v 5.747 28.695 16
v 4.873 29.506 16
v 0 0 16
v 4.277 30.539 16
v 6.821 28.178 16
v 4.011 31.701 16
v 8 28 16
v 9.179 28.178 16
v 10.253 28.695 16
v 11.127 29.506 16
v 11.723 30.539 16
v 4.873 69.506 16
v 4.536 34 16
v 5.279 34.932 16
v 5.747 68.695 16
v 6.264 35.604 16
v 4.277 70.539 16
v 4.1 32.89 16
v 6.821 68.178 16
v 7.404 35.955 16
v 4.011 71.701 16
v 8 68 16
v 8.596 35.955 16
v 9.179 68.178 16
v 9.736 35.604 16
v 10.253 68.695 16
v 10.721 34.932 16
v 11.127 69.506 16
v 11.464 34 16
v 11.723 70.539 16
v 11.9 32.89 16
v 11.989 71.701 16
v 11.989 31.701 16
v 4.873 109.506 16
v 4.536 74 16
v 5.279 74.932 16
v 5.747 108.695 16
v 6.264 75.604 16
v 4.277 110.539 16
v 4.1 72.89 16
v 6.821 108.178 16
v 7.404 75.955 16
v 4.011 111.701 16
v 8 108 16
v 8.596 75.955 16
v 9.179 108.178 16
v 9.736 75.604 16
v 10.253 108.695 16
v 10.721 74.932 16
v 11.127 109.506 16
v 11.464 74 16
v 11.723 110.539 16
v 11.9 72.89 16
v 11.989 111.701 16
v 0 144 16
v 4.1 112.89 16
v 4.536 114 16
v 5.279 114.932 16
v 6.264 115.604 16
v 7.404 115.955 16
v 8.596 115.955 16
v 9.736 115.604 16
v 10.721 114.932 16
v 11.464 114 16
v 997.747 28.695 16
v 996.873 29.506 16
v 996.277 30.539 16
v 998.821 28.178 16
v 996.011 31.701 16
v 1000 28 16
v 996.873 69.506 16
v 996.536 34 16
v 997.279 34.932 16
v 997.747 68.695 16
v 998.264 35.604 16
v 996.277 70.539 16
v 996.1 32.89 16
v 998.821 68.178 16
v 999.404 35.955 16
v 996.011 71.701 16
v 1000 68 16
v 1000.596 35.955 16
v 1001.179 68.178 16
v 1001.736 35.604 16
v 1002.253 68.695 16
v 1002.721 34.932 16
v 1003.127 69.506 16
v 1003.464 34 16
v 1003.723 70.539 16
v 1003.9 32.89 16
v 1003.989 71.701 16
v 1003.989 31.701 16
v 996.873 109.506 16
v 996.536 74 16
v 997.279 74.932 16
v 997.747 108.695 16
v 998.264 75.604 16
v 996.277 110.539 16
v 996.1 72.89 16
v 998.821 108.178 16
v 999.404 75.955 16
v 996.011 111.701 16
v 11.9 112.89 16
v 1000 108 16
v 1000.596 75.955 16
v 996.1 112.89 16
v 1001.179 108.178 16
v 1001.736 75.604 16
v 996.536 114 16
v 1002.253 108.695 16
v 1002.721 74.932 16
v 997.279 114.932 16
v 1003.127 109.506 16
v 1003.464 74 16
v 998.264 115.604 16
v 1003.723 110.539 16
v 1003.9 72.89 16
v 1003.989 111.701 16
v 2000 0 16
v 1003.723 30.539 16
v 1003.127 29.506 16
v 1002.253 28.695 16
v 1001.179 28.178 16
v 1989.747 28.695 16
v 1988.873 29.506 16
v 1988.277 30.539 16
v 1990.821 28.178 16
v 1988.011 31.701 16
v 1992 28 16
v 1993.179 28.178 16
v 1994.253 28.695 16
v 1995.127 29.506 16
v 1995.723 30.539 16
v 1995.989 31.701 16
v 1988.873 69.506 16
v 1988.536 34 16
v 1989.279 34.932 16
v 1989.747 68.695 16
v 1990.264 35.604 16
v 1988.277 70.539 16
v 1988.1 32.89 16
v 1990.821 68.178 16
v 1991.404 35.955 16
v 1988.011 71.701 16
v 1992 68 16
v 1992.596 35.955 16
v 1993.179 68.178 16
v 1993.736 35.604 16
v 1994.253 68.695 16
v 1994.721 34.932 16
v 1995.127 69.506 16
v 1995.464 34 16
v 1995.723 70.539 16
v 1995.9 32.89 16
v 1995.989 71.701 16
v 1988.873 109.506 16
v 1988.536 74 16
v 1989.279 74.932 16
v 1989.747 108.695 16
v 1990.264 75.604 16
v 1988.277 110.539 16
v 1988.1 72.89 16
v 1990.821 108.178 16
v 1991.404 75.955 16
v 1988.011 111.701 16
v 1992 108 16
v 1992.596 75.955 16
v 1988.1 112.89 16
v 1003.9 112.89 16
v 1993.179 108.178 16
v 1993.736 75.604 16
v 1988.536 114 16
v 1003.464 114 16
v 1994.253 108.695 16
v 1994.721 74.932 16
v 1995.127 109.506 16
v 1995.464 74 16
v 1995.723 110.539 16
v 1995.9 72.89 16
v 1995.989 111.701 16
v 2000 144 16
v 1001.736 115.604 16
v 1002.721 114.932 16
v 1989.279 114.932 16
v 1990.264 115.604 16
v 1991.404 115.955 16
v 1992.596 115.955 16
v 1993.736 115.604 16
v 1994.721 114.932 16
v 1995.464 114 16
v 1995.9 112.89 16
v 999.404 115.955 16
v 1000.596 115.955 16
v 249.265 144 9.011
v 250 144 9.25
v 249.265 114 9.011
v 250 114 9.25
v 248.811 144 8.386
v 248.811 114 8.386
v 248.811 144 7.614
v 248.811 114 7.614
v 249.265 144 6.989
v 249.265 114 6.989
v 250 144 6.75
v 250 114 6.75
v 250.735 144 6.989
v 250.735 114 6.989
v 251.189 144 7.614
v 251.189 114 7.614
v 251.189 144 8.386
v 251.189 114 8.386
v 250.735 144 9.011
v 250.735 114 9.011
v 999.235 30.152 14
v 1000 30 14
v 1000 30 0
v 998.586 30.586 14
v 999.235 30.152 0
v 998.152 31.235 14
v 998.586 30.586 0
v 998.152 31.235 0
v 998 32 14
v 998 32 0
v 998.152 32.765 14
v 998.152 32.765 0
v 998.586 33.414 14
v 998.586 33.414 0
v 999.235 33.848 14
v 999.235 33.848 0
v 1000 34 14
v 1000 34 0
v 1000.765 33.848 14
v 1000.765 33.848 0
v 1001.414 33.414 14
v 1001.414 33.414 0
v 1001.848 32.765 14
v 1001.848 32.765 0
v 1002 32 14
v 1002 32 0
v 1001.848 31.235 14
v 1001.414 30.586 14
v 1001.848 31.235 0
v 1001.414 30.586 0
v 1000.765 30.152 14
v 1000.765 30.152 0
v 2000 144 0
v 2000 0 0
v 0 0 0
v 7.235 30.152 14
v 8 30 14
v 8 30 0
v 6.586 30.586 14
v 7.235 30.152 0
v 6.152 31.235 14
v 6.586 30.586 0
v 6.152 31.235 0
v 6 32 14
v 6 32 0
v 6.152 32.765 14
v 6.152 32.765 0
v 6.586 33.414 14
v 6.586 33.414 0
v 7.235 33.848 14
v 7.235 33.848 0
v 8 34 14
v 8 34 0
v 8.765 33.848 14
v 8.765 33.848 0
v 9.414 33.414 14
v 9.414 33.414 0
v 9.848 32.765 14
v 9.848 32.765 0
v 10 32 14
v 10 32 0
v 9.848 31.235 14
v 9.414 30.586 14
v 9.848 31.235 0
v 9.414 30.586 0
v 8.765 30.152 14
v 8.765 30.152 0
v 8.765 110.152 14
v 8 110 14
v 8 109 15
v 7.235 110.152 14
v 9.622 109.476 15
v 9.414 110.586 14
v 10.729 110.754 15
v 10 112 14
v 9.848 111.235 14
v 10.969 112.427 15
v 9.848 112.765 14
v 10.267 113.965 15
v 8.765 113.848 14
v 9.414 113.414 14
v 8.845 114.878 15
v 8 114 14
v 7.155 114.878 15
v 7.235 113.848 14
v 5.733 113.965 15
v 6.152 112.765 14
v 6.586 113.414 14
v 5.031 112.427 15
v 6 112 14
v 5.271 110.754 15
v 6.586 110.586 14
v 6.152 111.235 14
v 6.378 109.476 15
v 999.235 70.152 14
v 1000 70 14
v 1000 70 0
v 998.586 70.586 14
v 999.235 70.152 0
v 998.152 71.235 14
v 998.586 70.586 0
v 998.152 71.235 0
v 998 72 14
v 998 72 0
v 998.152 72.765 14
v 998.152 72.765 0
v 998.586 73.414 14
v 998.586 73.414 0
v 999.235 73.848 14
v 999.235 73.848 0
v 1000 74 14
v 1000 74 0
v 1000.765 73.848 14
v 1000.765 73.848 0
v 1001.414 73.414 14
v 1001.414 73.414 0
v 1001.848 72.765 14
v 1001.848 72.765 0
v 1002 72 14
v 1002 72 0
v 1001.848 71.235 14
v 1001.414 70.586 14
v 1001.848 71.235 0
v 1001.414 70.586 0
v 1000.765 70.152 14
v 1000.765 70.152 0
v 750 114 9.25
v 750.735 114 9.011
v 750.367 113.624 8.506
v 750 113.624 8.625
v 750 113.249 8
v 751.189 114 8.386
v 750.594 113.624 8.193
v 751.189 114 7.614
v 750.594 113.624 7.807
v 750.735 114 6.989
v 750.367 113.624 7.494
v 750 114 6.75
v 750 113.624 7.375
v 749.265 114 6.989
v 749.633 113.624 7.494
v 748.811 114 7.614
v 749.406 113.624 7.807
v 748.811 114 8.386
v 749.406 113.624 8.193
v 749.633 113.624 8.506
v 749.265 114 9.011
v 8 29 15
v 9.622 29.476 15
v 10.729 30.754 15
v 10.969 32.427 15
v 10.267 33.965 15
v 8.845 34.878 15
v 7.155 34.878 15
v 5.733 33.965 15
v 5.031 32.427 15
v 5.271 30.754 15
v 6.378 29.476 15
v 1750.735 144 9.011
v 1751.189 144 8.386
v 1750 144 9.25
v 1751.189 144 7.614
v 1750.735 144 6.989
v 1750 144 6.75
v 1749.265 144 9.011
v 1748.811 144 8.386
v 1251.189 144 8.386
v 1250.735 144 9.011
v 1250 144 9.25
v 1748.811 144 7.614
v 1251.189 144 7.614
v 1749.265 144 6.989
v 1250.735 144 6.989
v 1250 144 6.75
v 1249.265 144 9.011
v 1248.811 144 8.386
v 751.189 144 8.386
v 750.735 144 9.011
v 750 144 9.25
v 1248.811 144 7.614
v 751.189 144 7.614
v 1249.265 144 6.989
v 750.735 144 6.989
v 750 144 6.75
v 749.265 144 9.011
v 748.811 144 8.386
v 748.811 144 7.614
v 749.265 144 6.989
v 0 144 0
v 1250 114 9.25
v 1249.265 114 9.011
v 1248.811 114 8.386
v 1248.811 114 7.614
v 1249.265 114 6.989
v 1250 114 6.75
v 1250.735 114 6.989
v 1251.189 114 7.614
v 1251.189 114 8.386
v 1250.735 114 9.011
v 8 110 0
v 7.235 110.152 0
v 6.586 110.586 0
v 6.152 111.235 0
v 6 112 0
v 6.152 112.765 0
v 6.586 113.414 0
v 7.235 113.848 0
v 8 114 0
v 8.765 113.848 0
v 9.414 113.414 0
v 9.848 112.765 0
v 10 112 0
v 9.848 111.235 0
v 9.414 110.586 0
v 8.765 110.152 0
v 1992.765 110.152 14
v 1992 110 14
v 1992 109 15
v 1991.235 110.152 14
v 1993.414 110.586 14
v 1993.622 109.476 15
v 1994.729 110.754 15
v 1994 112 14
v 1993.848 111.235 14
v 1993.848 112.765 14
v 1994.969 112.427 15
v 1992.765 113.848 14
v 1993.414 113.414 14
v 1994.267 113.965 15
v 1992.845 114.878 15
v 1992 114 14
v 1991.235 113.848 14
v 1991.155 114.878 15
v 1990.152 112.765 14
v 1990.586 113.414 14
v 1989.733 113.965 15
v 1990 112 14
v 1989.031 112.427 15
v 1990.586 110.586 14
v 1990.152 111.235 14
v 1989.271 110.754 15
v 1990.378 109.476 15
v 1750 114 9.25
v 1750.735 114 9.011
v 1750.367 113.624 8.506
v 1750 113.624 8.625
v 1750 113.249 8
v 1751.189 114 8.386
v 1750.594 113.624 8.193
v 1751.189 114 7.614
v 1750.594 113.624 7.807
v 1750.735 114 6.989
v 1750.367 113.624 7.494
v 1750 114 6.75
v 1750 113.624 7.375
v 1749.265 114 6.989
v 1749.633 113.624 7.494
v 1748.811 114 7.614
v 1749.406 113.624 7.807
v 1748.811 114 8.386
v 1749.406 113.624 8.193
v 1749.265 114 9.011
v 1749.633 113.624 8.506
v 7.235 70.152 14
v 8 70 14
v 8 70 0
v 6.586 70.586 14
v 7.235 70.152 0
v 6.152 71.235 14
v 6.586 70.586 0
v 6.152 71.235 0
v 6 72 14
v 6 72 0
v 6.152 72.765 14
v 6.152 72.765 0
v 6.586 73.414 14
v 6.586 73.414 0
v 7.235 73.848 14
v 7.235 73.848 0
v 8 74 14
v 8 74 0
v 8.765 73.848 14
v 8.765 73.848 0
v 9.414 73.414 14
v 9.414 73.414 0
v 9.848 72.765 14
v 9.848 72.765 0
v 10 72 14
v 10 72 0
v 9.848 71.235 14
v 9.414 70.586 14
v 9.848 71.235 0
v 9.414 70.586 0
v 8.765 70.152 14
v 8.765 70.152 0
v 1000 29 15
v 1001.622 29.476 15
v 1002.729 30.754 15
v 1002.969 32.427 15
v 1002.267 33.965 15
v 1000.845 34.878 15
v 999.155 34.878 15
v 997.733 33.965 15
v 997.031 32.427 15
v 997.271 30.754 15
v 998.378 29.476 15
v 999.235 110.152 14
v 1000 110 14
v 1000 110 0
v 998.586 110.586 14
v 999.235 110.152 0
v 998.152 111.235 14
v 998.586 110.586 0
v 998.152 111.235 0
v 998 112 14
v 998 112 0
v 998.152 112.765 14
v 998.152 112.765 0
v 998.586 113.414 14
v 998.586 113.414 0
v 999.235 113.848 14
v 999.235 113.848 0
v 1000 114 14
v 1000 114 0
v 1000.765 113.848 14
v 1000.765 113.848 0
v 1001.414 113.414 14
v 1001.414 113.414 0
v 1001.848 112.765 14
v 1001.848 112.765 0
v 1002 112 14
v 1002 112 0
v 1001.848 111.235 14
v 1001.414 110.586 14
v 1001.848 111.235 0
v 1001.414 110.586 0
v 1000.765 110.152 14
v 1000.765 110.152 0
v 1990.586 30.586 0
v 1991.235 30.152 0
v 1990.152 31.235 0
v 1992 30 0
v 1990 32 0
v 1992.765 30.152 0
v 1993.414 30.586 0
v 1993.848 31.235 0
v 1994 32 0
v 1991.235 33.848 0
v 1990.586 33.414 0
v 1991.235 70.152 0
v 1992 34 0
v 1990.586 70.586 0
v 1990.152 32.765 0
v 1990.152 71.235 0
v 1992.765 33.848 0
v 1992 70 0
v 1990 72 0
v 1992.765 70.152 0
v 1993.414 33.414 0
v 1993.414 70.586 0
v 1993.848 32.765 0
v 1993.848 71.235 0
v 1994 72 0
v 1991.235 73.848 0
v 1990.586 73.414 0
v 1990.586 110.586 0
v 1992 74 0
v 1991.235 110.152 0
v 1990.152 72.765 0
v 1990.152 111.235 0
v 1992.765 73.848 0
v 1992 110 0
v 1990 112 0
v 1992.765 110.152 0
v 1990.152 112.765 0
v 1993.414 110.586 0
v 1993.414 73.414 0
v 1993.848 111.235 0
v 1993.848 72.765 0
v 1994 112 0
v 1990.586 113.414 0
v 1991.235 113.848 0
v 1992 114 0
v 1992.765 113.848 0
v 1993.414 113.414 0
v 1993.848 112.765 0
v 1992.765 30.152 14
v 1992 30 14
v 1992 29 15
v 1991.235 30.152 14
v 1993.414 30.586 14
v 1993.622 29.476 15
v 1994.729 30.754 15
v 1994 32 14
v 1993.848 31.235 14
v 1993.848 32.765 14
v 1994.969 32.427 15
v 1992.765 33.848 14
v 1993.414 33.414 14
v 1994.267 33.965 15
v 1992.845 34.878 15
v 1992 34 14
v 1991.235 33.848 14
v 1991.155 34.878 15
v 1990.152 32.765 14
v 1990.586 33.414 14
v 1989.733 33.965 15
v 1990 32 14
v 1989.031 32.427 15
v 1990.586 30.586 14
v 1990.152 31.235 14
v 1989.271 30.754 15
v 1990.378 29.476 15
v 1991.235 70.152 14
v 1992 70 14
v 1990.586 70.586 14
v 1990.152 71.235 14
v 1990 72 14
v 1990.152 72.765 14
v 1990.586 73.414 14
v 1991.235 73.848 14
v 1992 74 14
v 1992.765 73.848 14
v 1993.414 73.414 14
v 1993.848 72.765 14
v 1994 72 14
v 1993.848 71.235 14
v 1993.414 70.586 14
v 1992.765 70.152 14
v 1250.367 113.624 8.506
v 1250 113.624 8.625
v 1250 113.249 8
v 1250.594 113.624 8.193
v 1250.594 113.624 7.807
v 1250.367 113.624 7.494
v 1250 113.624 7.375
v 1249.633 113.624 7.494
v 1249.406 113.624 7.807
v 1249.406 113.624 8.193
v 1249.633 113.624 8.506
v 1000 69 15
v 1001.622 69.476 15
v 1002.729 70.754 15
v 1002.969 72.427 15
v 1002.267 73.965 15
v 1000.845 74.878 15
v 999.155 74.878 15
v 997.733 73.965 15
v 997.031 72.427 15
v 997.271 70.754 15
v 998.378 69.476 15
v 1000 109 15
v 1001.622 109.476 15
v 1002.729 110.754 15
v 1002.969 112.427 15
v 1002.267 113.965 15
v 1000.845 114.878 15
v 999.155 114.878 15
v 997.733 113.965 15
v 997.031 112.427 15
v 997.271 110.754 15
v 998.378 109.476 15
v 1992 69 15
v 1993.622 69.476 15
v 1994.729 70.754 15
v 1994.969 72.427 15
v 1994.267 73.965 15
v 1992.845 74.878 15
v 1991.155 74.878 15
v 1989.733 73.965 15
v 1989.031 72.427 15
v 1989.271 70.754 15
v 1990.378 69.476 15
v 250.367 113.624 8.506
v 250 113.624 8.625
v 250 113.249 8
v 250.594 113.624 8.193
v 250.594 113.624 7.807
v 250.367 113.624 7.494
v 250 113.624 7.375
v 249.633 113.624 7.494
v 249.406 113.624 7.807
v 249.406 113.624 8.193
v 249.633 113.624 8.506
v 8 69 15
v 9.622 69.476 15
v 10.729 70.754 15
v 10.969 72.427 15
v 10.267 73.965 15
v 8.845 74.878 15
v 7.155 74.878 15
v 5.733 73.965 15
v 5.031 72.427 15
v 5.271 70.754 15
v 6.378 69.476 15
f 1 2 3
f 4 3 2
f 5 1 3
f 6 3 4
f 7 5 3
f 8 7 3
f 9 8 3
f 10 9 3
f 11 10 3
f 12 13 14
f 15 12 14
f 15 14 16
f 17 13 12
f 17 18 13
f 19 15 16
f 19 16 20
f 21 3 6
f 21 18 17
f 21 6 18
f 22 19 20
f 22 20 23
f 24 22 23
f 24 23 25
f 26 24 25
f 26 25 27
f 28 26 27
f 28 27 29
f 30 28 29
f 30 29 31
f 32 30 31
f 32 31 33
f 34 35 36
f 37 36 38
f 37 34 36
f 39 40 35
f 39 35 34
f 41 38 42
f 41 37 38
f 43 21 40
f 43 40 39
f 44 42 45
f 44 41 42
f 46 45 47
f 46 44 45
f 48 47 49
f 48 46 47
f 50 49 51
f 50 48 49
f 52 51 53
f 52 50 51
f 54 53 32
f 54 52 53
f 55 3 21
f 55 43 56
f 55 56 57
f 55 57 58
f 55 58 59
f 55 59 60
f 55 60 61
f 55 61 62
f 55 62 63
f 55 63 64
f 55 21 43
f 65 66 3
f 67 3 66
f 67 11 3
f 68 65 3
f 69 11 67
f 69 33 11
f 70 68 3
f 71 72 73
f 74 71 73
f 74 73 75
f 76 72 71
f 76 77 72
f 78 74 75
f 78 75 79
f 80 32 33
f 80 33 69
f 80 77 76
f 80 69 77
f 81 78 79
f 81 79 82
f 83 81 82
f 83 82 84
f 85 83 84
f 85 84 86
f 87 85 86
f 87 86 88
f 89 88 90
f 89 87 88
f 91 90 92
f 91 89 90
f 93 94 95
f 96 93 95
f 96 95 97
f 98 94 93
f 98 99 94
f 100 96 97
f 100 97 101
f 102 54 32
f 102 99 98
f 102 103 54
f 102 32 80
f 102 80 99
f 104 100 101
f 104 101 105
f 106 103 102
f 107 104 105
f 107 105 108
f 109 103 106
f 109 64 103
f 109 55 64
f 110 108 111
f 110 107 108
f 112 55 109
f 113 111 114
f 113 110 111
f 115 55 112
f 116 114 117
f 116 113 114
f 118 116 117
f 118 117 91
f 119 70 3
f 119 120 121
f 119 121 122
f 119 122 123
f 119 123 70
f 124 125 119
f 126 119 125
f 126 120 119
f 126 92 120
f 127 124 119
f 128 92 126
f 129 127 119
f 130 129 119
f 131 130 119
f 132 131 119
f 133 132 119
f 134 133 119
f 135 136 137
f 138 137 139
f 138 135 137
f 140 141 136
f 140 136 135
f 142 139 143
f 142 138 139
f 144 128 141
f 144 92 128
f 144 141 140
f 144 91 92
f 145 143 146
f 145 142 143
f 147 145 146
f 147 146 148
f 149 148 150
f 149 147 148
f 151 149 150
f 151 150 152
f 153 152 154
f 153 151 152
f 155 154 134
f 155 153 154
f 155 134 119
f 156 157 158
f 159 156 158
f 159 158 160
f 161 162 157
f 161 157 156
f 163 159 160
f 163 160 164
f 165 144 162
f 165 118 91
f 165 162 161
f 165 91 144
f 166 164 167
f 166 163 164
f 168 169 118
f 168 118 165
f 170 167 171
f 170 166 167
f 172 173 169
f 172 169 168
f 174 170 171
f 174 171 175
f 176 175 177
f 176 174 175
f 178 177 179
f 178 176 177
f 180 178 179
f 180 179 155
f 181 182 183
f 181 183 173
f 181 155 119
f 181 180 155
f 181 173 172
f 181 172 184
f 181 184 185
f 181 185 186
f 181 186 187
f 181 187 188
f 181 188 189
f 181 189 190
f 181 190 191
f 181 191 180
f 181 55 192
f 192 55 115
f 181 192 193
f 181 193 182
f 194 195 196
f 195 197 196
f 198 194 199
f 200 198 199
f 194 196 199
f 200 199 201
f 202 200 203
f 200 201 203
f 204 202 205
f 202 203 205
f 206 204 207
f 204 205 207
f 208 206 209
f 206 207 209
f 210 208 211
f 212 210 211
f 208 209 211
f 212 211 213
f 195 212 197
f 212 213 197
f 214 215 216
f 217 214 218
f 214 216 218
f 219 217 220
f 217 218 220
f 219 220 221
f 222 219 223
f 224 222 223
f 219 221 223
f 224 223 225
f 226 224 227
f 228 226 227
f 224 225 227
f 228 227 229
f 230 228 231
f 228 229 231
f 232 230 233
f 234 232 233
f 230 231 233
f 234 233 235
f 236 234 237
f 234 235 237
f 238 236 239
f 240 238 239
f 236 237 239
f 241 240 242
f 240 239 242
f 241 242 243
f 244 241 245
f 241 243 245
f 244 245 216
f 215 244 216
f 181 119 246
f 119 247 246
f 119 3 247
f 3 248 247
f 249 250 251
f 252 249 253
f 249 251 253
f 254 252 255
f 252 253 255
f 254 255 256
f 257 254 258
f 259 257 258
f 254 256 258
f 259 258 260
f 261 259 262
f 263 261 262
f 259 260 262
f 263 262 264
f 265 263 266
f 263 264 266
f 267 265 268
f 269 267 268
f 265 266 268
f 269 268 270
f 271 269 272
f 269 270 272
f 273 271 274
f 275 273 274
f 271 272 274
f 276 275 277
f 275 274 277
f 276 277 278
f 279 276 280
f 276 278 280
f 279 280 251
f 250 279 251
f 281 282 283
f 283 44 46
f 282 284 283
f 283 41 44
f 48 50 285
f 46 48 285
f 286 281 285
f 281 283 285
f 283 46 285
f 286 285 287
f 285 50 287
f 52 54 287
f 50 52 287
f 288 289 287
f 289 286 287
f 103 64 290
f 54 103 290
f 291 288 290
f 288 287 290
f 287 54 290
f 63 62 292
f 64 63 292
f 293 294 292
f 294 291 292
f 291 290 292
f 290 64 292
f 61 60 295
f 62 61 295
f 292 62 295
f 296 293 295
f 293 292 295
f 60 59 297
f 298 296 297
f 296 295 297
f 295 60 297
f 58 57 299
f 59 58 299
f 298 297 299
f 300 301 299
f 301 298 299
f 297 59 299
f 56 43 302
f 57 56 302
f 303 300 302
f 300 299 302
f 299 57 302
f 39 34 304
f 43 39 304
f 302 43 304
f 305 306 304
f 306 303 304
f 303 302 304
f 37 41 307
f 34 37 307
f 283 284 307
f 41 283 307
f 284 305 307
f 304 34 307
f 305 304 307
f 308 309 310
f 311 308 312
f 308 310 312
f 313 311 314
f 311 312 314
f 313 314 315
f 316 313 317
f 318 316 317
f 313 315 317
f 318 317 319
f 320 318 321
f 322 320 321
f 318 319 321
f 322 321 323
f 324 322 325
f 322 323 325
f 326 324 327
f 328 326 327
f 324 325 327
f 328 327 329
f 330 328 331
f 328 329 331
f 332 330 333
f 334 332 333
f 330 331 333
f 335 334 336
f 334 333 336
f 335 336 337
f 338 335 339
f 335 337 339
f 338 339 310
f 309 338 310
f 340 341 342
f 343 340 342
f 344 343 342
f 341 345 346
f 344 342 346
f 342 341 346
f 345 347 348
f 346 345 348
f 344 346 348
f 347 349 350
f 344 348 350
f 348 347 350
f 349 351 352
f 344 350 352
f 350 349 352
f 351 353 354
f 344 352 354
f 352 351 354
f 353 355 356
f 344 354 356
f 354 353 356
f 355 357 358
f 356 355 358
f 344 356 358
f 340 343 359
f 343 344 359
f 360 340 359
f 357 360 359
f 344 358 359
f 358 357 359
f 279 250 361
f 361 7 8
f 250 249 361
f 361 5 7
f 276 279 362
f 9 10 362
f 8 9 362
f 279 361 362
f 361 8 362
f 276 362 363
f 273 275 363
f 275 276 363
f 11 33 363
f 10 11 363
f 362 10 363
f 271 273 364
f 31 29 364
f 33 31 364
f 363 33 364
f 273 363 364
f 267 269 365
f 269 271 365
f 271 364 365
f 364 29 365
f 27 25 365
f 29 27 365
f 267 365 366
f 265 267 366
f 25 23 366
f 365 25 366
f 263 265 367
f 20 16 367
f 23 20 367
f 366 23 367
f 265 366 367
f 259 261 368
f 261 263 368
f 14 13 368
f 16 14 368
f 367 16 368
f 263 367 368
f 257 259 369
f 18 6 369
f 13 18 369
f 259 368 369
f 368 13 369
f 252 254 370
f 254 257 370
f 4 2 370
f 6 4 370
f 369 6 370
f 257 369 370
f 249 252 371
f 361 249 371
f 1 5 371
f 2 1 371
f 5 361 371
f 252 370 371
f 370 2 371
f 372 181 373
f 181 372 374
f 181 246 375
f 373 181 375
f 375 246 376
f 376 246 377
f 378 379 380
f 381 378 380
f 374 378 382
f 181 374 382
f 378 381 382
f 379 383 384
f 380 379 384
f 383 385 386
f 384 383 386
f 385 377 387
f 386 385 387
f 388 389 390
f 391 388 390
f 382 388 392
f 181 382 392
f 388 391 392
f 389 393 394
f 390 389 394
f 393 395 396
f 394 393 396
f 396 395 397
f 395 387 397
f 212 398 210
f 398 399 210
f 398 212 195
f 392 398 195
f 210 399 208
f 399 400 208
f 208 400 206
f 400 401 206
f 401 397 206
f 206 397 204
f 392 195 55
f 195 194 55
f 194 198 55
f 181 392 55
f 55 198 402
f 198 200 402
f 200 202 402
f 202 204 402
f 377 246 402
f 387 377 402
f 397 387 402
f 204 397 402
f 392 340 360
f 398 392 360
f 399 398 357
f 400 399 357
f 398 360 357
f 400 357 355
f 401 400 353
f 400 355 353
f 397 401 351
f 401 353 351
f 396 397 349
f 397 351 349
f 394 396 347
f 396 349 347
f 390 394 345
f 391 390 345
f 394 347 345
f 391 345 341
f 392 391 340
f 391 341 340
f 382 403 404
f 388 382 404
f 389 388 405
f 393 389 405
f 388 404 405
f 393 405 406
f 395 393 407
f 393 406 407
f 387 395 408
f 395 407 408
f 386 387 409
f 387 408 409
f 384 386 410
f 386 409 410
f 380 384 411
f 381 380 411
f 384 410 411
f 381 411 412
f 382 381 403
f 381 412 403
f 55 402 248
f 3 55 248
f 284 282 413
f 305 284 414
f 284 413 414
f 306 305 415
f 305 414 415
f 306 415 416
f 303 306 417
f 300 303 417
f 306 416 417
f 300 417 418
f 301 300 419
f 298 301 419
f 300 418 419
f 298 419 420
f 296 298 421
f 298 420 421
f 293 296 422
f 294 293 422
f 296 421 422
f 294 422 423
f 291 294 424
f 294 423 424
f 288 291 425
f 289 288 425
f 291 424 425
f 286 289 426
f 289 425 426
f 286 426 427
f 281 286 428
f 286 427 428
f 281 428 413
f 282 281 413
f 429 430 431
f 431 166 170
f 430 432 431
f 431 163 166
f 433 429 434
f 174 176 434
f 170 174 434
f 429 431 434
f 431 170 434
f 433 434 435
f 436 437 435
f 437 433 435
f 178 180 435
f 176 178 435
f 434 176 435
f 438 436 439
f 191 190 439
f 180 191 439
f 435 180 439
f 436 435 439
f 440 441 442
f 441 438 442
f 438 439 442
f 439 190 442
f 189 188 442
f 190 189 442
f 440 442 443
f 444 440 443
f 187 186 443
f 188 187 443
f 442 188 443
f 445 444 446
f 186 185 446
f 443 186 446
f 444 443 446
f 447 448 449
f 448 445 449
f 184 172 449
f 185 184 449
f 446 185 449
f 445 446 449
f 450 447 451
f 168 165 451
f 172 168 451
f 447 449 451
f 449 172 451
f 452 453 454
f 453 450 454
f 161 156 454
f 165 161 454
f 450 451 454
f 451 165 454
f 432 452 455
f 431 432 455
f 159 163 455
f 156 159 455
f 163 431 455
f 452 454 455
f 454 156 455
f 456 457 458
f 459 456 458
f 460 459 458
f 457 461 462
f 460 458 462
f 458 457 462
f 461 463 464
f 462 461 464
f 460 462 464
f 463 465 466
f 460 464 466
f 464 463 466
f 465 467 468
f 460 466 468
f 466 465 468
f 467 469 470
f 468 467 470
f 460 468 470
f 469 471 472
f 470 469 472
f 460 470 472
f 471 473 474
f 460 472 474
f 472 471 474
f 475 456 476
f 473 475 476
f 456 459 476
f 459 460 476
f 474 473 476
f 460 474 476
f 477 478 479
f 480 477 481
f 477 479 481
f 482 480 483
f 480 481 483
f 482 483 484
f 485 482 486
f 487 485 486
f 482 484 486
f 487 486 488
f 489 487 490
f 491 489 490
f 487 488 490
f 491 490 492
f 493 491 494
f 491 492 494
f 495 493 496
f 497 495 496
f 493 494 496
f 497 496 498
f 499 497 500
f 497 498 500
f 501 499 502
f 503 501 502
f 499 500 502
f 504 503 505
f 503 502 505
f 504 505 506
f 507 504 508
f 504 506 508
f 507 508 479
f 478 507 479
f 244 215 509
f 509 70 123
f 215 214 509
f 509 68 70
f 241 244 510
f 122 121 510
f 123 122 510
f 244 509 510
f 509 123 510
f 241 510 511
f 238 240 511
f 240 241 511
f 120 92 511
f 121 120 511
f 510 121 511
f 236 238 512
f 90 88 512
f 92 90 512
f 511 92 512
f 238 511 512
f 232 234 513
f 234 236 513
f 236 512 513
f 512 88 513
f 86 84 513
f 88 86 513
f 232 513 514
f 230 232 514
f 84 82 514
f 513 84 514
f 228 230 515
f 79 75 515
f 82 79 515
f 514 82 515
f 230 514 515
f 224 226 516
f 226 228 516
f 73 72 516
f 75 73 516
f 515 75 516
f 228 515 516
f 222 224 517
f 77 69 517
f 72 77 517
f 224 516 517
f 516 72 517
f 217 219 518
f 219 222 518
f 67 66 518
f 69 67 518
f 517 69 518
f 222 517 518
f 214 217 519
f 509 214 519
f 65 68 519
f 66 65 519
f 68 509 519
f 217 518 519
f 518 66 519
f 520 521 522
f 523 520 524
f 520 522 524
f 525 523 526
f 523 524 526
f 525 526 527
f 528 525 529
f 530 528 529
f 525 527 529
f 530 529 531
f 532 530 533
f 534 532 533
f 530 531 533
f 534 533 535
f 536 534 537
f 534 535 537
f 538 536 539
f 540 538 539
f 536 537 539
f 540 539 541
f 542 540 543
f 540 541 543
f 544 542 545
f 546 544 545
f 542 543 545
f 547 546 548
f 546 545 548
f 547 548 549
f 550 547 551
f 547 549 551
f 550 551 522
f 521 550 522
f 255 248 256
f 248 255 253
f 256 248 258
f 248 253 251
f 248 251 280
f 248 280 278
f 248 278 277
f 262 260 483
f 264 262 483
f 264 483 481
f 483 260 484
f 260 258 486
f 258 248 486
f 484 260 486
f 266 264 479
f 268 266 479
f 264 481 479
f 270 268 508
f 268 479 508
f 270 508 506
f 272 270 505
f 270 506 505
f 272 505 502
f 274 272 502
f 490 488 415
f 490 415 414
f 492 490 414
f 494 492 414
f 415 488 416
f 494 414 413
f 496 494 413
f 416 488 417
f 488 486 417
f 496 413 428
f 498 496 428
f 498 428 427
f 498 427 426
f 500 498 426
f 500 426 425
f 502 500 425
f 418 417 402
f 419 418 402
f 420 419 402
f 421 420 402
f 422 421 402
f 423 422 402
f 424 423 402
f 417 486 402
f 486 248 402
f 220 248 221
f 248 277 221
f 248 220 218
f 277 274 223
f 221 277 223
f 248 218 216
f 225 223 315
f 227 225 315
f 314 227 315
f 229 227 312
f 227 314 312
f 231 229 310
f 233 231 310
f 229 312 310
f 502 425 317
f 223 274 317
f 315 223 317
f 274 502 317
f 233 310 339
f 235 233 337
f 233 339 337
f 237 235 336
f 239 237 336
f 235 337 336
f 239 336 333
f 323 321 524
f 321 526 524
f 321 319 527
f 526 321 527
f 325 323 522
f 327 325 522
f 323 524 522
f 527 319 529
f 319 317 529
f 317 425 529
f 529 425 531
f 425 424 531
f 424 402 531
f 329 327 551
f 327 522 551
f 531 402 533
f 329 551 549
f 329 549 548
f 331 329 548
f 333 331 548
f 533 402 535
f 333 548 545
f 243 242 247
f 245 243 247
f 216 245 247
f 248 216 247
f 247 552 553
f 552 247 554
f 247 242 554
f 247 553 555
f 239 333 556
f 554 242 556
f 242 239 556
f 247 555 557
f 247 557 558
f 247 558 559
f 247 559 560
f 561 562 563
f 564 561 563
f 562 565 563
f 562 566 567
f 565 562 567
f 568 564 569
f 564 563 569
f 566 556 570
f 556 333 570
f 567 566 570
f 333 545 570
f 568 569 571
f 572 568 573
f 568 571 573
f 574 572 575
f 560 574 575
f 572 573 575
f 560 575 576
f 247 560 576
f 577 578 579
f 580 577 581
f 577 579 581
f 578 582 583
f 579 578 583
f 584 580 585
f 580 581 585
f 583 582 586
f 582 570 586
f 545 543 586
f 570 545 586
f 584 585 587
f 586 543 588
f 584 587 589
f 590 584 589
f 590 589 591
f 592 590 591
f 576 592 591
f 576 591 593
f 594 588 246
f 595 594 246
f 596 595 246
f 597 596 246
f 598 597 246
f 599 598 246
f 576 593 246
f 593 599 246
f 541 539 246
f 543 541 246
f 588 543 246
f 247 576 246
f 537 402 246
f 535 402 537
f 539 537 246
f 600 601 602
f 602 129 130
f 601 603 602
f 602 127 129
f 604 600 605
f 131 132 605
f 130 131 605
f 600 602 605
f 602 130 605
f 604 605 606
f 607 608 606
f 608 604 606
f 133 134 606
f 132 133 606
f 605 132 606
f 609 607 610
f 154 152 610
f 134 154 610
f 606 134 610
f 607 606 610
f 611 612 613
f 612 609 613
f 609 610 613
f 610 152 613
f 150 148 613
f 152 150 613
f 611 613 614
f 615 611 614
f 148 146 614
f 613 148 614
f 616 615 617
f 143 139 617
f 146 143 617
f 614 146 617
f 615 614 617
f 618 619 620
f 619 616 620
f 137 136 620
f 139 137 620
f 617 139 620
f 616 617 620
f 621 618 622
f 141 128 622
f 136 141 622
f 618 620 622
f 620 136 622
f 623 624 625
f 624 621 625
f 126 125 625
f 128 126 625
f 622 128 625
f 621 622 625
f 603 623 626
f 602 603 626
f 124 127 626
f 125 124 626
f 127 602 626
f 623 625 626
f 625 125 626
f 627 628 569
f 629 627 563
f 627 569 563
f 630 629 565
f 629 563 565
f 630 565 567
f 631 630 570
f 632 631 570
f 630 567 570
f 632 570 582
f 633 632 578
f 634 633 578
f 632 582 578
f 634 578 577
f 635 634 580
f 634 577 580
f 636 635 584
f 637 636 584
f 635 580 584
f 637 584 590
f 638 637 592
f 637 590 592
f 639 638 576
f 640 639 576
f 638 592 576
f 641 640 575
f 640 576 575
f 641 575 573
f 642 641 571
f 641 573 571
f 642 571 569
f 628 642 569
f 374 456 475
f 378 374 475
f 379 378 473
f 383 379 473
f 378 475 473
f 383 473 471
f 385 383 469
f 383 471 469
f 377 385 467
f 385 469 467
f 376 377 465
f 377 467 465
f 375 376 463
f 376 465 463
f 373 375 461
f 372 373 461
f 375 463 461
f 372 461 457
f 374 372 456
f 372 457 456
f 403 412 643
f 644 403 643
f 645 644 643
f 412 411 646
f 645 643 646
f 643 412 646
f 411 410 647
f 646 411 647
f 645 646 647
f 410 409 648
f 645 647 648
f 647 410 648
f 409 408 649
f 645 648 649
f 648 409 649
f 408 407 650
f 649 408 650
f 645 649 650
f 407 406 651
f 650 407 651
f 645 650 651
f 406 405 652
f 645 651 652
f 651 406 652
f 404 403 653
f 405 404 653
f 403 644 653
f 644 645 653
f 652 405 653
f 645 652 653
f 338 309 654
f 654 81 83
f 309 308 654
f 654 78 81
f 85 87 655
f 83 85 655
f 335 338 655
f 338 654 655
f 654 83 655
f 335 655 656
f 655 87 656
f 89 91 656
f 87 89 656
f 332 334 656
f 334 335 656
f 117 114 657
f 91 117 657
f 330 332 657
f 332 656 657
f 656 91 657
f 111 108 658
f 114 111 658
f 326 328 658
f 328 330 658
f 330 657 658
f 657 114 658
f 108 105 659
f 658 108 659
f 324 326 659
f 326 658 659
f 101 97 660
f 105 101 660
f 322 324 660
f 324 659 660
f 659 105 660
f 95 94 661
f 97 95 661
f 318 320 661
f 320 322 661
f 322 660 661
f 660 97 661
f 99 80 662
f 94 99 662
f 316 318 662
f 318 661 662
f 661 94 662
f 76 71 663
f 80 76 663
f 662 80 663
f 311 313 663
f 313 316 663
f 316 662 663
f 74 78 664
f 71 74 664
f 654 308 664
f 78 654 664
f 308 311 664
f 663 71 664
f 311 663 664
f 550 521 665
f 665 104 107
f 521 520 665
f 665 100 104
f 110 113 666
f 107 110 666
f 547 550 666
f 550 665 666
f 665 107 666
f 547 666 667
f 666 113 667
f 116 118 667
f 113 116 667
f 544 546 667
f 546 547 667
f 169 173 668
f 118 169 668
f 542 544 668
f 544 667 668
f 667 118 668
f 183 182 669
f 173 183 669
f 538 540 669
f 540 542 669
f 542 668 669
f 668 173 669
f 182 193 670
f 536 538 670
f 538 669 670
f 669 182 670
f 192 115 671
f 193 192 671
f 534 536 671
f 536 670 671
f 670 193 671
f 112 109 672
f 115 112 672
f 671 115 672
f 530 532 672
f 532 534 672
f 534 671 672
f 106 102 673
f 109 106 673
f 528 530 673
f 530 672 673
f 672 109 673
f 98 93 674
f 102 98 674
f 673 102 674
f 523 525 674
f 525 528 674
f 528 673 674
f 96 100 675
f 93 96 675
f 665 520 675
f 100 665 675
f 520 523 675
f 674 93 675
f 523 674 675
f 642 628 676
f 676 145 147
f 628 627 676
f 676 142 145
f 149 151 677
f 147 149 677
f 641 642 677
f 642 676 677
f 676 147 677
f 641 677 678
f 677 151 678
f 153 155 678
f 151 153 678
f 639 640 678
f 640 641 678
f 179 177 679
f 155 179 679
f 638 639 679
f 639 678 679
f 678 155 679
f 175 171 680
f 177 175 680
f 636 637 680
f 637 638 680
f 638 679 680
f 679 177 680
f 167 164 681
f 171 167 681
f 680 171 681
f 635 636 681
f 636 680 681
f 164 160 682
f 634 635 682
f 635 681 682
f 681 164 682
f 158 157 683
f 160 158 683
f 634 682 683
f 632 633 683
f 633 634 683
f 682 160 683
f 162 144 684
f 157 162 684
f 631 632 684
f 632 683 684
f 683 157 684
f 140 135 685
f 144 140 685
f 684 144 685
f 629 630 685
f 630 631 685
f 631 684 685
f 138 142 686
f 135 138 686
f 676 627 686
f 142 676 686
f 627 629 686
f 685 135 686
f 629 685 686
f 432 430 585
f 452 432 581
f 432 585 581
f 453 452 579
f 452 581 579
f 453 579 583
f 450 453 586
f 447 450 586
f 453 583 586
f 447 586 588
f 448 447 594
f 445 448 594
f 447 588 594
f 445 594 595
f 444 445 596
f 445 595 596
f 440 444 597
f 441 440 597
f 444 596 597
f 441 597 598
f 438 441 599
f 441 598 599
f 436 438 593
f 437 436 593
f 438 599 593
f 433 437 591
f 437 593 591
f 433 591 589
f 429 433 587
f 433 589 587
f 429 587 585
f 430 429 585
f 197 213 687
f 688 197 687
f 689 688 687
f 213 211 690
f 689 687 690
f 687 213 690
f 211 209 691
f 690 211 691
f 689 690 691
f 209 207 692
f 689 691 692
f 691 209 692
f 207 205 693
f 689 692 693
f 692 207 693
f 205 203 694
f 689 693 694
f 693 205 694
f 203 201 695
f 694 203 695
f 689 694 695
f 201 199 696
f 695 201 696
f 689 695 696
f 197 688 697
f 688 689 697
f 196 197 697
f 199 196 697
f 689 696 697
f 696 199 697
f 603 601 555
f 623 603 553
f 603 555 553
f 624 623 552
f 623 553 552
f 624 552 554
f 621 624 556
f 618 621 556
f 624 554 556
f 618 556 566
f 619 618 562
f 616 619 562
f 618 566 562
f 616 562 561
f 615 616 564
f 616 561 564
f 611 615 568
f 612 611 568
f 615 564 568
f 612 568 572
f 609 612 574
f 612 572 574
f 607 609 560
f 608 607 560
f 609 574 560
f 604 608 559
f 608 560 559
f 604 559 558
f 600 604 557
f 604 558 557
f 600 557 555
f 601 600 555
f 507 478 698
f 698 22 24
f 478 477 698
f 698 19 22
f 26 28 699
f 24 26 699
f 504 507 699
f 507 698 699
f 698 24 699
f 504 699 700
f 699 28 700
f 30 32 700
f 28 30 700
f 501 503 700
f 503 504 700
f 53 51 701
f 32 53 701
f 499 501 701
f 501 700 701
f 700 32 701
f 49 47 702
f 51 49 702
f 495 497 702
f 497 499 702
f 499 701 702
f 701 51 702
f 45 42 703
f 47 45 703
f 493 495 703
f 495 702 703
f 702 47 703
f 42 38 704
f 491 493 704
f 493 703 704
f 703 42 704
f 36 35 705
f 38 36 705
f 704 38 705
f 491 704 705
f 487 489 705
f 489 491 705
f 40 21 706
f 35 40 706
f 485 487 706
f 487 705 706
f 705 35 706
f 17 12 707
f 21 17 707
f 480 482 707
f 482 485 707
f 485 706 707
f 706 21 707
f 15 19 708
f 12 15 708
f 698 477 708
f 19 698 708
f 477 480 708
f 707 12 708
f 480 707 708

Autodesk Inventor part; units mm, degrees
ref_plane "YZ Plane" through (0, 0, 0) normal (1, 0, 0) x (0, 1, 0)
ref_plane "XZ Plane" through (0, 0, 0) normal (0, 1, 0) x (-1, 0, 0)
ref_plane "XY Plane" through (0, 0, 0) normal (0, 0, 1) x (1, 0, 0)
sketch "Skizze1" plane through (0, 0, 0) normal (0, 0, 1) x (1, 0, 0)
  line L0 (0, 0) -> (2000, 0)
  line L1 (2000, 0) -> (2000, 144)
  line L2 (2000, 144) -> (0, 144)
  line L3 (0, 144) -> (0, 0)
  line L4 (1000, 0) -> (1000, 144) construction
  line L5 (1992, 144) -> (1992, 0) construction
  line L6 (2000, 112) -> (0, 112) construction
  line L7 (2000, 32) -> (0, 32) construction
  circle A0 centre (1992, 112) radius 1.5
  circle A1 centre (1992, 32) radius 1.5
  line L8 (8, 144) -> (8, 0) construction
  circle A2 centre (8, 112) radius 1.5
  circle A3 centre (8, 72) radius 1.5
  circle A4 centre (8, 32) radius 1.5
  circle A5 centre (1992, 72) radius 1.5
  circle A6 centre (1000, 72) radius 1.5
  circle A7 centre (1000, 112) radius 1.5
  circle A8 centre (1000, 32) radius 1.5
  point P0 (2000, 72)
  dimension "d0" = 2000
  dimension "d1" = 144
  dimension "d20" = 8
  dimension "d21" = 40
  dimension "d22" = 40
  dimension "d23" = 3
  dimension "d24" = 3
  dimension "d25" = 8
  dimension "d26" = 3
  dimension "d27" = 3
  dimension "d28" = 3
  dimension "d29" = 3
  dimension "d30" = 3
  dimension "d31" = 3
  dimension "d32" = 3
extrude "Extrusion1" add sketch "Skizze1" along normal blind 16
sketch "Skizze3" plane through (0, 144, 0) normal (0, 1, 0) x (1, 0, 0)
  line L0 (0, 0) -> (2000, 0) construction
  line L1 (2000, 0) -> (2000, -16) construction
  line L2 (2000, -16) -> (0, -16) construction
  line L3 (0, -16) -> (0, 0) construction
  line L4 (0, 0) -> (0, -16) projected
  line L5 (0, -8) -> (2000, -8) construction
  line L6 (2000, 0) -> (2000, -16) projected
  line L7 (0, -16) -> (2000, -16) construction
  line L8 (1000, -16) -> (1000, 0) construction
  point P0 (750, -8)
  point P1 (250, -8)
  point P2 (1250, -8)
  point P3 (1750, -8)
  dimension "d120" = 250
  dimension "d121" = 250
  dimension "d122" = 250
  dimension "d123" = 250
hole "Bohrung12" at (750, 144, 8) at (250, 144, 8) at (1250, 144, 8) at (1750, 144, 8) direction (0, -1, 0) diameter 2.5 depth 30 tip angle 118
sketch "Skizze2" plane through (0, 0, 16) normal (0, 0, 1) x (1, 0, 0)
  circle A0 centre (1000, 72) radius 1.5 projected
  circle A1 centre (1992, 112) radius 1.5 projected
  circle A2 centre (1992, 72) radius 1.5 projected
  circle A3 centre (1992, 32) radius 1.5 projected
  circle A4 centre (8, 72) radius 1.5 projected
  circle A5 centre (8, 112) radius 1.5 projected
  circle A6 centre (8, 32) radius 1.5 projected
  circle A7 centre (1000, 32) radius 1.5 projected
  circle A8 centre (1000, 112) radius 1.5 projected
  point P0 (0, 0)
hole "Bohrung7" at (1000, 72, 16) at (1992, 112, 16) at (1992, 72, 16) at (1992, 32, 16) at (8, 72, 16) at (8, 32, 16) at (8, 112, 16) at (1000, 112, 16) at (1000, 32, 16) direction (0, 0, -1) diameter 4 end through all countersink diameter 8 countersink angle 90
properties part number "licht_200_back" material "Spanplatte"
